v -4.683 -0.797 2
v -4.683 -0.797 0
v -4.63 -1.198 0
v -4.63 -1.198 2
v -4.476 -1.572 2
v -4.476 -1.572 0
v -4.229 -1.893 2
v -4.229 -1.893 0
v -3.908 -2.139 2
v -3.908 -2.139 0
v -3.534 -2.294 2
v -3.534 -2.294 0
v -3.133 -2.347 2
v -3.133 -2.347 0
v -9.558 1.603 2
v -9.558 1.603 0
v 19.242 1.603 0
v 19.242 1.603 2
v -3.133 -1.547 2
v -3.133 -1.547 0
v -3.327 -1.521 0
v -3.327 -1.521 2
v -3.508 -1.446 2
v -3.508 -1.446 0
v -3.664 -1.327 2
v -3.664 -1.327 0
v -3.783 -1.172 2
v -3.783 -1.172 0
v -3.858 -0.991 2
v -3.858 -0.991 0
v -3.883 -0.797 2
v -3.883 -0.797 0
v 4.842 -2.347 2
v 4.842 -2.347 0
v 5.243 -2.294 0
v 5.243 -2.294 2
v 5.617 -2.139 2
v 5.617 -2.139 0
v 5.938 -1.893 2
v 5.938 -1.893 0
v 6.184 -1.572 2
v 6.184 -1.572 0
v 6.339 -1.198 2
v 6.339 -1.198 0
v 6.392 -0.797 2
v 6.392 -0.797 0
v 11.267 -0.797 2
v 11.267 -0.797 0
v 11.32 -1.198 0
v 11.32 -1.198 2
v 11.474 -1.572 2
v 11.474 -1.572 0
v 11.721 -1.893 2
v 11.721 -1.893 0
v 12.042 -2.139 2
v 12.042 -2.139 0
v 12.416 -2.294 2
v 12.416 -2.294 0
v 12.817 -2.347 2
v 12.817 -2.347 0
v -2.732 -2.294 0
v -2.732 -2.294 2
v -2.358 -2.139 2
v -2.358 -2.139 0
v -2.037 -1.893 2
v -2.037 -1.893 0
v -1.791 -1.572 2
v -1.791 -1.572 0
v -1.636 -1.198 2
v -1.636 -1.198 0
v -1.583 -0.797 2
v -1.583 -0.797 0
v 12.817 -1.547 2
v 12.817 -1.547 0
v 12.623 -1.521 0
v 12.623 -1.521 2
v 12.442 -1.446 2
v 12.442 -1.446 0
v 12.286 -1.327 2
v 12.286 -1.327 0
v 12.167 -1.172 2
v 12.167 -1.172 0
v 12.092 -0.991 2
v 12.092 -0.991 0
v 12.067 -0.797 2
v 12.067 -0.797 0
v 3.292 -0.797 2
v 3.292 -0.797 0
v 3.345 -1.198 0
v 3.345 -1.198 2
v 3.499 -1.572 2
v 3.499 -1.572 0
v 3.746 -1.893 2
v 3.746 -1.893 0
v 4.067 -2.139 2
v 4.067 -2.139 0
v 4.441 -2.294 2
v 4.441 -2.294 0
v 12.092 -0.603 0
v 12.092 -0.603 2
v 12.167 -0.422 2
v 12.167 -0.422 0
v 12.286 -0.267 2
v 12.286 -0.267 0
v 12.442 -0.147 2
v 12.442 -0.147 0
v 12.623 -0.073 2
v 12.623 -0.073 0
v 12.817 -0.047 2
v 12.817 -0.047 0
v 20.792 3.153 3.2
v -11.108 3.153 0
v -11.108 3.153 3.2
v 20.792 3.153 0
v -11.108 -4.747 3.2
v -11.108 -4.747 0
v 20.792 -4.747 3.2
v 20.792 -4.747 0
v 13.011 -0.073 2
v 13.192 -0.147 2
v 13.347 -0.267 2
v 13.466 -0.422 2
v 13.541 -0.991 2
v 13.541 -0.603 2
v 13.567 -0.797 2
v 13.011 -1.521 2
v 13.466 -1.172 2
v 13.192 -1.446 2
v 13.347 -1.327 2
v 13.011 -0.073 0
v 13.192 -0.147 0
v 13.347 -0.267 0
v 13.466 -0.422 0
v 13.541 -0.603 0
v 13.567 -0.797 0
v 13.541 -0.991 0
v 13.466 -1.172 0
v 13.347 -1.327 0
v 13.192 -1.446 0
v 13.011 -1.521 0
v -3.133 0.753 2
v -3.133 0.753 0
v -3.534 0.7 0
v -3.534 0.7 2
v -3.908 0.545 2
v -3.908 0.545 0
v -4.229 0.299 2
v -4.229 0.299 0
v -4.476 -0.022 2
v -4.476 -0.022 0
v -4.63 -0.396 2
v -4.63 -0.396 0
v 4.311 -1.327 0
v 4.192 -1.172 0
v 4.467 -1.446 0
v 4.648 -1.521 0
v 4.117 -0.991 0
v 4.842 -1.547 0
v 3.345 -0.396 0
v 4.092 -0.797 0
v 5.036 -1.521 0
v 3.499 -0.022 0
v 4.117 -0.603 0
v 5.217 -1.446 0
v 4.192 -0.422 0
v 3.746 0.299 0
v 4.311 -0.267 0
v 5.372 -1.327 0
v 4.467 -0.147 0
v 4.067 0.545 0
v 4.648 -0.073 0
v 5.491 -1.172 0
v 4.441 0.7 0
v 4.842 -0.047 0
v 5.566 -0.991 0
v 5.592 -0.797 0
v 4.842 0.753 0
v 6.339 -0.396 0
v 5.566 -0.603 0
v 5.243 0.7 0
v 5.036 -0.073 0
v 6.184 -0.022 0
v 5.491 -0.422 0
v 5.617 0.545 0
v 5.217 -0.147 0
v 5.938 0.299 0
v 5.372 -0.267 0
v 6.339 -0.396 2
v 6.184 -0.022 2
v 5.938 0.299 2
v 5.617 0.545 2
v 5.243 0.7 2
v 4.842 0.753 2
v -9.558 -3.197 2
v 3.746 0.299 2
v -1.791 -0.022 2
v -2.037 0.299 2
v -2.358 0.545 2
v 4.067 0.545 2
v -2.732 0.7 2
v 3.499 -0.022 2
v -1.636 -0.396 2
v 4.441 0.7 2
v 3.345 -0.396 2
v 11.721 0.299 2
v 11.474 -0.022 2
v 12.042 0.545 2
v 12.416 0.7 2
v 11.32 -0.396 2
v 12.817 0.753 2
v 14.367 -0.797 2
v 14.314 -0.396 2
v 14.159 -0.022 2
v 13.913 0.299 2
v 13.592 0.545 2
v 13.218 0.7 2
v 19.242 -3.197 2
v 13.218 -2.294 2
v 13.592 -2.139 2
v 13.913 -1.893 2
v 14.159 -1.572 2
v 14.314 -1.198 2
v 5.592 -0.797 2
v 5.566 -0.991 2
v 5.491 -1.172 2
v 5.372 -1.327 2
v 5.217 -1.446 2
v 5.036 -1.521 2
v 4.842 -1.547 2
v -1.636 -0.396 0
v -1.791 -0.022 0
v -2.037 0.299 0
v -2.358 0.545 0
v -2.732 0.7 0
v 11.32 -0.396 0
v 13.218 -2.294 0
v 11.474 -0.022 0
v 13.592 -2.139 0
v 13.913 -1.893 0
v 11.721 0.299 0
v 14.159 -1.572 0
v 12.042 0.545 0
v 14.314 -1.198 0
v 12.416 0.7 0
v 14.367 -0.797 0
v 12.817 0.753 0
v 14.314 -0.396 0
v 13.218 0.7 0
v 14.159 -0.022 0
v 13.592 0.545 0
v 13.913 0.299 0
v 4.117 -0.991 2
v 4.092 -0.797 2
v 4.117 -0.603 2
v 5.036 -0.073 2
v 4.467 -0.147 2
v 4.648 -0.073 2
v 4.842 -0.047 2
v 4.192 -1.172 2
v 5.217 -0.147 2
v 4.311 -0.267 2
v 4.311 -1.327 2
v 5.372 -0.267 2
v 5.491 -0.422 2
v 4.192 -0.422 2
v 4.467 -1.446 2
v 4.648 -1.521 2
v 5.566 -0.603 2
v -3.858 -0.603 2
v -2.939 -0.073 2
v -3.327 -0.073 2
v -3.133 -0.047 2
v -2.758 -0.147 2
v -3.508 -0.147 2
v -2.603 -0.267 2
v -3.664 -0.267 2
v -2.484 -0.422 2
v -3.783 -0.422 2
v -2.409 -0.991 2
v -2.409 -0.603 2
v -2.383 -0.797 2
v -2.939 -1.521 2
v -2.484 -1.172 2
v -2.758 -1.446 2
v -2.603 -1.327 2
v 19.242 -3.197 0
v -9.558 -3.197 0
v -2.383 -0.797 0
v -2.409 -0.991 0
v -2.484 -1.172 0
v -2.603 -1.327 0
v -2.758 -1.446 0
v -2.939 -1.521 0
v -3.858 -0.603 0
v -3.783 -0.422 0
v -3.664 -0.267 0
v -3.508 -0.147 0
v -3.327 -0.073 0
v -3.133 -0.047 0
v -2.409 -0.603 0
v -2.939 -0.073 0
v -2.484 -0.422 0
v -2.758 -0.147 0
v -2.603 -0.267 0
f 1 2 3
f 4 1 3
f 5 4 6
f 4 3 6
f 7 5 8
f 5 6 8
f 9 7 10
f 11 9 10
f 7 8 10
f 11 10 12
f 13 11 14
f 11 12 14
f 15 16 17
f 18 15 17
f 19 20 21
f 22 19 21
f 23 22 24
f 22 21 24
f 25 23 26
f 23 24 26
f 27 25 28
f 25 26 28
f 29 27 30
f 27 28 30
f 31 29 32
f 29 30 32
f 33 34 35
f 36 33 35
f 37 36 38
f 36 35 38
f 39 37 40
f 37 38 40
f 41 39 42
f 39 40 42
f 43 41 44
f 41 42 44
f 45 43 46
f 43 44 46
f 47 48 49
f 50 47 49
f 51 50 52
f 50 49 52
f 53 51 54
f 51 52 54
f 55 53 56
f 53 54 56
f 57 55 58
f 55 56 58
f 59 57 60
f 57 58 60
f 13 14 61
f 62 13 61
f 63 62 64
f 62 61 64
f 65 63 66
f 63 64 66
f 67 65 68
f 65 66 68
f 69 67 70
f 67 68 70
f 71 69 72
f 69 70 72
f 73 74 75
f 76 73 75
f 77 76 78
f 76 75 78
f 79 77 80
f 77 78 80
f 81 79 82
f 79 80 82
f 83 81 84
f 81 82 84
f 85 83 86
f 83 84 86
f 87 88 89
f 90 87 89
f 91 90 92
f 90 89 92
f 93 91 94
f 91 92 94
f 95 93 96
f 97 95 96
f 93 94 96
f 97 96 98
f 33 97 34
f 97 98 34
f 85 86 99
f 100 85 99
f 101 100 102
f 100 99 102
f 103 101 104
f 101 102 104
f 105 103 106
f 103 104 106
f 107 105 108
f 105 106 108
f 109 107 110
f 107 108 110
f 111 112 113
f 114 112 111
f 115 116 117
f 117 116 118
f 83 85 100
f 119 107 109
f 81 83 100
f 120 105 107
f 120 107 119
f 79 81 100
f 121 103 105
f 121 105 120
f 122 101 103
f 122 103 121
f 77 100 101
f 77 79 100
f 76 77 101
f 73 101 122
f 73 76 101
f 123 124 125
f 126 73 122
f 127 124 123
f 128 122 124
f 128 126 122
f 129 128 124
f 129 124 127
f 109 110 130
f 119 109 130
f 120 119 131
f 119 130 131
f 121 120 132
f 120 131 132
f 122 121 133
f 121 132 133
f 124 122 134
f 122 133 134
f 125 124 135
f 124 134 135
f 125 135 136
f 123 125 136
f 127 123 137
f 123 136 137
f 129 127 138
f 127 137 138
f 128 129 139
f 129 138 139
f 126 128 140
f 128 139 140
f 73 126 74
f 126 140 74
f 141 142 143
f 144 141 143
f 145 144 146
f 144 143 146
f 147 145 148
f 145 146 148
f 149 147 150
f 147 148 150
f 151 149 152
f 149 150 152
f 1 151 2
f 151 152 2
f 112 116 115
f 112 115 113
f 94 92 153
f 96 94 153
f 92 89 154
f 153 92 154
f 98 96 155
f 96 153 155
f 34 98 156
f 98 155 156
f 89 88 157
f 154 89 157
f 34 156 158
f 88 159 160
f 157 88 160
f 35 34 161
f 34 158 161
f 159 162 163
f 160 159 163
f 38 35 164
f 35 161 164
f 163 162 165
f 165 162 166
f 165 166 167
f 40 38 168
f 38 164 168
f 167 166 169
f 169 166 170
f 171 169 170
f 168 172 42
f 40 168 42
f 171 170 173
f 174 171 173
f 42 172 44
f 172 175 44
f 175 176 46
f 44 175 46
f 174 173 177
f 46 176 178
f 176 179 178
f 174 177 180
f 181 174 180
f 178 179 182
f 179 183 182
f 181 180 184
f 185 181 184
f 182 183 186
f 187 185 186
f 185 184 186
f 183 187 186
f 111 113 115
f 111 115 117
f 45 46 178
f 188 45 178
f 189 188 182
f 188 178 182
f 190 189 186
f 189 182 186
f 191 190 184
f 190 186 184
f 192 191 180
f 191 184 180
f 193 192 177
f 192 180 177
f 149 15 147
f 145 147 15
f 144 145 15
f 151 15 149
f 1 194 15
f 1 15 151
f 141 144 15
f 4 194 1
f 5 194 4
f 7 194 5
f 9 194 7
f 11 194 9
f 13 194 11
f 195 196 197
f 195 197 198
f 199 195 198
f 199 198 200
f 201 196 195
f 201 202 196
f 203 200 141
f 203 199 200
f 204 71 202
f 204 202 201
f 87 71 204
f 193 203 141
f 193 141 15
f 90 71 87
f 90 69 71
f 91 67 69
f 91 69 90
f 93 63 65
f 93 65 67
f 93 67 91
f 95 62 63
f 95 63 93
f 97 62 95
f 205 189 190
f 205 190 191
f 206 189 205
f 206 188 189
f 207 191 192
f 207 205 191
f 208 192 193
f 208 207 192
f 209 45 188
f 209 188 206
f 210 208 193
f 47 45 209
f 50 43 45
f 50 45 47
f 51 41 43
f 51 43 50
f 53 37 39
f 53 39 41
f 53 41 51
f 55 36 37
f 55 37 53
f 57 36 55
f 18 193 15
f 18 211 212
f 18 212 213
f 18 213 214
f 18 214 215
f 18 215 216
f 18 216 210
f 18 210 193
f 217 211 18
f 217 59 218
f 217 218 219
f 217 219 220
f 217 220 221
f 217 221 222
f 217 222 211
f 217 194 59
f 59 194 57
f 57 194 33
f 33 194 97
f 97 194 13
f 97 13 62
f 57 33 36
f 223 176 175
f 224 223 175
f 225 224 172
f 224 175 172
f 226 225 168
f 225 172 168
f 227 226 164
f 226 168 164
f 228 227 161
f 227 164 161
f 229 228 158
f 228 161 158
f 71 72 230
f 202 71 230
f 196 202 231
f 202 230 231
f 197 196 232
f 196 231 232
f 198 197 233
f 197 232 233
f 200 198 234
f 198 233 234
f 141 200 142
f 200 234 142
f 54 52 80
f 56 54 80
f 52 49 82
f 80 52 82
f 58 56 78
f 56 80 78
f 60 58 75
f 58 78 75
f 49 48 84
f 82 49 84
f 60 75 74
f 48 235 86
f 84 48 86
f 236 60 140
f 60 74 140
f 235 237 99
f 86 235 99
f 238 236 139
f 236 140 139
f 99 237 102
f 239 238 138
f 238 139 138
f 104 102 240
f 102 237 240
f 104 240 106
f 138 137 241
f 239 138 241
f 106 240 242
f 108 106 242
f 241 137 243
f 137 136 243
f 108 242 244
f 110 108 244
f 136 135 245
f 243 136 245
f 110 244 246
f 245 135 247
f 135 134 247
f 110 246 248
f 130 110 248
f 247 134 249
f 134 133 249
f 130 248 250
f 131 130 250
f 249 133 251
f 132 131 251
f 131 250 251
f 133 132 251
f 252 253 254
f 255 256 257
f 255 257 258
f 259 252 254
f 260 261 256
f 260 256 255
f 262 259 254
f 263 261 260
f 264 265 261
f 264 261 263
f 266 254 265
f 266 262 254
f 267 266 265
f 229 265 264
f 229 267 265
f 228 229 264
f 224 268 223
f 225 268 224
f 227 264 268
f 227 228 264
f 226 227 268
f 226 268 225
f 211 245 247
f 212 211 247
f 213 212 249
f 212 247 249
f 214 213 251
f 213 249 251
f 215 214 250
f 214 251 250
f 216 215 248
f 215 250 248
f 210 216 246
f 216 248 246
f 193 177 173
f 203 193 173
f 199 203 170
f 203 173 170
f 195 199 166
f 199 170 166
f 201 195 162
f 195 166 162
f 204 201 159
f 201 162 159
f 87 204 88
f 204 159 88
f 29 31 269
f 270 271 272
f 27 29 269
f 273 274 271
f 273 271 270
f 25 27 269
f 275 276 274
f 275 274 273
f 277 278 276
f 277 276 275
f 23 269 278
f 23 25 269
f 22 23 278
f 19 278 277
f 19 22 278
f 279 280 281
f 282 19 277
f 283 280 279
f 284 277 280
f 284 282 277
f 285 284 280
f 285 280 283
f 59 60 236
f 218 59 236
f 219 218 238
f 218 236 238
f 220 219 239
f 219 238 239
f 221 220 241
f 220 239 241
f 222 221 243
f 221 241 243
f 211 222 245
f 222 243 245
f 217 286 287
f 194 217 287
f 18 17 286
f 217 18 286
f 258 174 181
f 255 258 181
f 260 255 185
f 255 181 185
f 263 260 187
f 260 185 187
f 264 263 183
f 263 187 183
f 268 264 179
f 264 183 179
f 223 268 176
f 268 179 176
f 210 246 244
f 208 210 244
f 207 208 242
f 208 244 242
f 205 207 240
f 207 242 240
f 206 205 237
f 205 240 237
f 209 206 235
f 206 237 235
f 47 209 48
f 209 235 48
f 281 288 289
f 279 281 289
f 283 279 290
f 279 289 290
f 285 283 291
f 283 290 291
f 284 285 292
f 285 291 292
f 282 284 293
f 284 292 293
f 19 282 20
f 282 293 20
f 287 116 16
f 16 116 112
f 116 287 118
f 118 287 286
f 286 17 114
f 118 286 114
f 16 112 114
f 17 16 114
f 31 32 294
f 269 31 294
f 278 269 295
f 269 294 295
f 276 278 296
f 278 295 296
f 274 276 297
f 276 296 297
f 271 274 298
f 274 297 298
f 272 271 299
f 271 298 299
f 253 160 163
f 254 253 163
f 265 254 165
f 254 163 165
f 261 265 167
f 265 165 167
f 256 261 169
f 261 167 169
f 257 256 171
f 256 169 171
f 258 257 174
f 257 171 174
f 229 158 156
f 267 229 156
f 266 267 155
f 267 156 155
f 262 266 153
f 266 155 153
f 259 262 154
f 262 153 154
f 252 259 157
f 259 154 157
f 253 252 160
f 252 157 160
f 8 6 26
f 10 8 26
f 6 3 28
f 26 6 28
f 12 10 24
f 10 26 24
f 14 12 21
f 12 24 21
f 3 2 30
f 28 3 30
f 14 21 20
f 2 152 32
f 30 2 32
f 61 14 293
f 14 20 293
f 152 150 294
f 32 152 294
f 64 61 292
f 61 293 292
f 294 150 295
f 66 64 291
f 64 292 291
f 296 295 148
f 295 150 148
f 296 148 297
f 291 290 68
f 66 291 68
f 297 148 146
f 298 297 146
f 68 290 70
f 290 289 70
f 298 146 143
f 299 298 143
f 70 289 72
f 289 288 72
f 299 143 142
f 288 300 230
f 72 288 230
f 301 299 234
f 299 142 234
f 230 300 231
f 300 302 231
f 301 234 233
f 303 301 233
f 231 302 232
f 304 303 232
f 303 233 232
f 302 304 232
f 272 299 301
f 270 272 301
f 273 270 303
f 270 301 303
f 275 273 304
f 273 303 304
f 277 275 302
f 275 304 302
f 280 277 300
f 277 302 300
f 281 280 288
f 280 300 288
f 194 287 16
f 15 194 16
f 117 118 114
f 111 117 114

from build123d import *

# Parameters (mm, degrees)
F0_W     = 31.9
F0_H     = 7.9
F1_DEPTH = 3.2
F3_DEPTH = 2


with BuildPart() as f1:
    # F0 (on Top) → F1 (new body)
    with BuildSketch(Plane.XY):
        with Locations((4.8417709768, -0.7969564563)):
            Rectangle(F0_W, F0_H)
    extrude(amount=F1_DEPTH)

    # F2 (on face) → F3 (cut)
    with BuildSketch(Plane(origin=(0, 0, 0), x_dir=(1, 0, 0), z_dir=(0, 0, -1))):
        with BuildLine():
            Line((-3.1332290232, 3.1969564563), (-9.5582290232, 3.1969564563))
            Line((-9.5582290232, 3.1969564563), (-9.5582290232, 0.7969564563))
            Line((-9.5582290232, 0.7969564563), (-4.6832290232, 0.7969564563))
            ThreePointArc((-4.6832290232, 0.7969564563), (-4.2292445341, 1.8929719672), (-3.1332290232, 2.3469564563))
            Line((-3.1332290232, 2.3469564563), (-3.1332290232, 3.1969564563))
        make_face()
        with BuildLine():
            Line((4.8417709768, 3.1969564563), (-3.1332290232, 3.1969564563))
            Line((-3.1332290232, 3.1969564563), (-3.1332290232, 2.3469564563))
            ThreePointArc((-3.1332290232, 2.3469564563), (-2.0372135124, 1.8929719672), (-1.5832290232, 0.7969564563))
            Line((-1.5832290232, 0.7969564563), (3.2917709768, 0.7969564563))
            ThreePointArc((3.2917709768, 0.7969564563), (3.7457554659, 1.8929719672), (4.8417709768, 2.3469564563))
            Line((4.8417709768, 2.3469564563), (4.8417709768, 3.1969564563))
        make_face()
        with BuildLine():
            Line((12.8167709768, 3.1969564563), (4.8417709768, 3.1969564563))
            Line((4.8417709768, 3.1969564563), (4.8417709768, 2.3469564563))
            ThreePointArc((4.8417709768, 2.3469564563), (5.9377864876, 1.8929719672), (6.3917709768, 0.7969564563))
            Line((6.3917709768, 0.7969564563), (11.2667709768, 0.7969564563))
            ThreePointArc((11.2667709768, 0.7969564563), (11.7207554659, 1.8929719672), (12.8167709768, 2.3469564563))
            Line((12.8167709768, 2.3469564563), (12.8167709768, 3.1969564563))
        make_face()
        with BuildLine():
            Line((19.2417709768, 3.1969564563), (12.8167709768, 3.1969564563))
            Line((12.8167709768, 3.1969564563), (12.8167709768, 2.3469564563))
            ThreePointArc((12.8167709768, 2.3469564563), (13.9127864876, 1.8929719672), (14.3667709768, 0.7969564563))
            Line((14.3667709768, 0.7969564563), (19.2417709768, 0.7969564563))
            Line((19.2417709768, 0.7969564563), (19.2417709768, 3.1969564563))
        make_face()
        with BuildLine():
            Line((19.2417709768, -1.6030435437), (19.2417709768, 0.7969564563))
            Line((19.2417709768, 0.7969564563), (14.3667709768, 0.7969564563))
            ThreePointArc((14.3667709768, 0.7969564563), (13.9127864876, -0.2990590545), (12.8167709768, -0.7530435437))
            Line((12.8167709768, -0.7530435437), (12.8167709768, -1.6030435437))
            Line((12.8167709768, -1.6030435437), (19.2417709768, -1.6030435437))
        make_face()
        with BuildLine():
            Line((11.2667709768, 0.7969564563), (6.3917709768, 0.7969564563))
            ThreePointArc((6.3917709768, 0.7969564563), (5.9377864876, -0.2990590545), (4.8417709768, -0.7530435437))
            Line((4.8417709768, -0.7530435437), (4.8417709768, -1.6030435437))
            Line((4.8417709768, -1.6030435437), (12.8167709768, -1.6030435437))
            Line((12.8167709768, -1.6030435437), (12.8167709768, -0.7530435437))
            ThreePointArc((12.8167709768, -0.7530435437), (11.7207554659, -0.2990590545), (11.2667709768, 0.7969564563))
        make_face()
        with BuildLine():
            Line((3.2917709768, 0.7969564563), (-1.5832290232, 0.7969564563))
            ThreePointArc((-1.5832290232, 0.7969564563), (-2.0372135124, -0.2990590545), (-3.1332290232, -0.7530435437))
            Line((-3.1332290232, -0.7530435437), (-3.1332290232, -1.6030435437))
            Line((-3.1332290232, -1.6030435437), (4.8417709768, -1.6030435437))
            Line((4.8417709768, -1.6030435437), (4.8417709768, -0.7530435437))
            ThreePointArc((4.8417709768, -0.7530435437), (3.7457554659, -0.2990590545), (3.2917709768, 0.7969564563))
        make_face()
        with BuildLine():
            Line((-4.6832290232, 0.7969564563), (-9.5582290232, 0.7969564563))
            Line((-9.5582290232, 0.7969564563), (-9.5582290232, -1.6030435437))
            Line((-9.5582290232, -1.6030435437), (-3.1332290232, -1.6030435437))
            Line((-3.1332290232, -1.6030435437), (-3.1332290232, -0.7530435437))
            ThreePointArc((-3.1332290232, -0.7530435437), (-4.2292445341, -0.2990590545), (-4.6832290232, 0.7969564563))
        make_face()
        with BuildLine():
            Line((-3.1332290232, 0.7969564563), (-3.1332290232, 1.5469564563))
            ThreePointArc((-3.1332290232, 1.5469564563), (-3.6635591091, 1.3272865422), (-3.8832290232, 0.7969564563))
            Line((-3.8832290232, 0.7969564563), (-3.1332290232, 0.7969564563))
        make_face()
        with BuildLine():
            Line((-3.1332290232, 0.7969564563), (-3.8832290232, 0.7969564563))
            ThreePointArc((-3.8832290232, 0.7969564563), (-3.6635591091, 0.2666263705), (-3.1332290232, 0.0469564563))
            Line((-3.1332290232, 0.0469564563), (-3.1332290232, 0.7969564563))
        make_face()
        with BuildLine():
            Line((-2.3832290232, 0.7969564563), (-3.1332290232, 0.7969564563))
            Line((-3.1332290232, 0.7969564563), (-3.1332290232, 0.0469564563))
            ThreePointArc((-3.1332290232, 0.0469564563), (-2.6028989373, 0.2666263705), (-2.3832290232, 0.7969564563))
        make_face()
        with BuildLine():
            ThreePointArc((-2.3832290232, 0.7969564563), (-2.6028989373, 1.3272865422), (-3.1332290232, 1.5469564563))
            Line((-3.1332290232, 1.5469564563), (-3.1332290232, 0.7969564563))
            Line((-3.1332290232, 0.7969564563), (-2.3832290232, 0.7969564563))
        make_face()
        with BuildLine():
            Line((4.8417709768, 0.7969564563), (4.8417709768, 1.5469564563))
            ThreePointArc((4.8417709768, 1.5469564563), (4.3114408909, 1.3272865422), (4.0917709768, 0.7969564563))
            Line((4.0917709768, 0.7969564563), (4.8417709768, 0.7969564563))
        make_face()
        with BuildLine():
            ThreePointArc((5.5917709768, 0.7969564563), (5.3721010627, 1.3272865422), (4.8417709768, 1.5469564563))
            Line((4.8417709768, 1.5469564563), (4.8417709768, 0.7969564563))
            Line((4.8417709768, 0.7969564563), (5.5917709768, 0.7969564563))
        make_face()
        with BuildLine():
            Line((4.8417709768, 0.0469564563), (4.8417709768, 0.7969564563))
            Line((4.8417709768, 0.7969564563), (4.0917709768, 0.7969564563))
            ThreePointArc((4.0917709768, 0.7969564563), (4.3114408909, 0.2666263705), (4.8417709768, 0.0469564563))
        make_face()
        with BuildLine():
            Line((5.5917709768, 0.7969564563), (4.8417709768, 0.7969564563))
            Line((4.8417709768, 0.7969564563), (4.8417709768, 0.0469564563))
            ThreePointArc((4.8417709768, 0.0469564563), (5.3721010627, 0.2666263705), (5.5917709768, 0.7969564563))
        make_face()
        with BuildLine():
            Line((12.8167709768, 0.7969564563), (12.8167709768, 1.5469564563))
            ThreePointArc((12.8167709768, 1.5469564563), (12.2864408909, 1.3272865422), (12.0667709768, 0.7969564563))
            Line((12.0667709768, 0.7969564563), (12.8167709768, 0.7969564563))
        make_face()
        with BuildLine():
            ThreePointArc((13.5667709768, 0.7969564563), (13.3471010627, 1.3272865422), (12.8167709768, 1.5469564563))
            Line((12.8167709768, 1.5469564563), (12.8167709768, 0.7969564563))
            Line((12.8167709768, 0.7969564563), (13.5667709768, 0.7969564563))
        make_face()
        with BuildLine():
            Line((13.5667709768, 0.7969564563), (12.8167709768, 0.7969564563))
            Line((12.8167709768, 0.7969564563), (12.8167709768, 0.0469564563))
            ThreePointArc((12.8167709768, 0.0469564563), (13.3471010627, 0.2666263705), (13.5667709768, 0.7969564563))
        make_face()
        with BuildLine():
            Line((12.8167709768, 0.0469564563), (12.8167709768, 0.7969564563))
            Line((12.8167709768, 0.7969564563), (12.0667709768, 0.7969564563))
            ThreePointArc((12.0667709768, 0.7969564563), (12.2864408909, 0.2666263705), (12.8167709768, 0.0469564563))
        make_face()
    extrude(amount=-F3_DEPTH, mode=Mode.SUBTRACT)


solid = f1.part
